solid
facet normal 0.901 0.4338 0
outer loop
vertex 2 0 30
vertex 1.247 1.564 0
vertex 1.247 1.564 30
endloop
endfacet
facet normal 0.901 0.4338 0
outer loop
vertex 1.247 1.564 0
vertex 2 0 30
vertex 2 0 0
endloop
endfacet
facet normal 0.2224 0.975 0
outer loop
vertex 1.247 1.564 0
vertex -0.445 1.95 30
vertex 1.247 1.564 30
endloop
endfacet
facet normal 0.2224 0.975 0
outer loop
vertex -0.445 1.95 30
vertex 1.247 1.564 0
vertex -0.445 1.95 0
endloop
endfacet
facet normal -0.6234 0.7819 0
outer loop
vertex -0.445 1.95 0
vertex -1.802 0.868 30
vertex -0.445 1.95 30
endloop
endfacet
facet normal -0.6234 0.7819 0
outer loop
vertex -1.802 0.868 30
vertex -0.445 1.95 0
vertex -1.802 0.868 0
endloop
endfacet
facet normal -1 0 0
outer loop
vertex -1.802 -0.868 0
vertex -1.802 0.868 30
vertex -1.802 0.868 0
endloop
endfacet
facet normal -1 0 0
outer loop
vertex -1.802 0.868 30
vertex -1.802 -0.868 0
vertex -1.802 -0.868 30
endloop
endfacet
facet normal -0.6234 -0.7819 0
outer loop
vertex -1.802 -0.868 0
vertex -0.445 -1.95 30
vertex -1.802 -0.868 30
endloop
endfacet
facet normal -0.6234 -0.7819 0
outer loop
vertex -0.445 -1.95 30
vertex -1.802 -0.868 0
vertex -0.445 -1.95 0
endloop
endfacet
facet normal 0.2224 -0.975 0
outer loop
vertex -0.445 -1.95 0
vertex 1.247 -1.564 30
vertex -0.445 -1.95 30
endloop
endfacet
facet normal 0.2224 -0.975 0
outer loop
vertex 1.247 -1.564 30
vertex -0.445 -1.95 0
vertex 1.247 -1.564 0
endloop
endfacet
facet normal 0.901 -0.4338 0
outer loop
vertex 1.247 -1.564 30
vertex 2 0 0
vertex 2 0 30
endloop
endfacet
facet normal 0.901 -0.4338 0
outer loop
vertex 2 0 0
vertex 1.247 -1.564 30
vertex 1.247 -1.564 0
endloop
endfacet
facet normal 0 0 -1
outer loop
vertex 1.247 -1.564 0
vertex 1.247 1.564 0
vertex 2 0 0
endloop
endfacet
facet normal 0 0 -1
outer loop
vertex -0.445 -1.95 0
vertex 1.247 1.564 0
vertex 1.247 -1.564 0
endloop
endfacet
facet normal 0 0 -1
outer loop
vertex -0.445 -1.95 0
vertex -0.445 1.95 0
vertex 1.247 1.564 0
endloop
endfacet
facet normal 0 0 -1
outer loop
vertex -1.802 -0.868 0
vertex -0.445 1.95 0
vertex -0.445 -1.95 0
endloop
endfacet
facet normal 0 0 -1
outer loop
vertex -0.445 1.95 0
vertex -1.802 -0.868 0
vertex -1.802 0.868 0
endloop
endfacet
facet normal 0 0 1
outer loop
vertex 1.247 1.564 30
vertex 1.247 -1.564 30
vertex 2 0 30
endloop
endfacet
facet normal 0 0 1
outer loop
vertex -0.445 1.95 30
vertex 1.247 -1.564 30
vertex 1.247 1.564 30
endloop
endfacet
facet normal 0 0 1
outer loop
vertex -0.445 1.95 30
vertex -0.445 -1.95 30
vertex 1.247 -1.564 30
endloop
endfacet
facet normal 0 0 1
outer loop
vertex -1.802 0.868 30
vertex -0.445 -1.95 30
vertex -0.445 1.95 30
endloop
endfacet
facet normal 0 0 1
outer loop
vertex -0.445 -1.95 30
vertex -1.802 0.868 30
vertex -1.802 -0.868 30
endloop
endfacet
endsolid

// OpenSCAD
// Generated by generate_scads.py
scale([1.0,1.0,1.0]) {
  cylinder(h=30, r=2, center=false);
}
